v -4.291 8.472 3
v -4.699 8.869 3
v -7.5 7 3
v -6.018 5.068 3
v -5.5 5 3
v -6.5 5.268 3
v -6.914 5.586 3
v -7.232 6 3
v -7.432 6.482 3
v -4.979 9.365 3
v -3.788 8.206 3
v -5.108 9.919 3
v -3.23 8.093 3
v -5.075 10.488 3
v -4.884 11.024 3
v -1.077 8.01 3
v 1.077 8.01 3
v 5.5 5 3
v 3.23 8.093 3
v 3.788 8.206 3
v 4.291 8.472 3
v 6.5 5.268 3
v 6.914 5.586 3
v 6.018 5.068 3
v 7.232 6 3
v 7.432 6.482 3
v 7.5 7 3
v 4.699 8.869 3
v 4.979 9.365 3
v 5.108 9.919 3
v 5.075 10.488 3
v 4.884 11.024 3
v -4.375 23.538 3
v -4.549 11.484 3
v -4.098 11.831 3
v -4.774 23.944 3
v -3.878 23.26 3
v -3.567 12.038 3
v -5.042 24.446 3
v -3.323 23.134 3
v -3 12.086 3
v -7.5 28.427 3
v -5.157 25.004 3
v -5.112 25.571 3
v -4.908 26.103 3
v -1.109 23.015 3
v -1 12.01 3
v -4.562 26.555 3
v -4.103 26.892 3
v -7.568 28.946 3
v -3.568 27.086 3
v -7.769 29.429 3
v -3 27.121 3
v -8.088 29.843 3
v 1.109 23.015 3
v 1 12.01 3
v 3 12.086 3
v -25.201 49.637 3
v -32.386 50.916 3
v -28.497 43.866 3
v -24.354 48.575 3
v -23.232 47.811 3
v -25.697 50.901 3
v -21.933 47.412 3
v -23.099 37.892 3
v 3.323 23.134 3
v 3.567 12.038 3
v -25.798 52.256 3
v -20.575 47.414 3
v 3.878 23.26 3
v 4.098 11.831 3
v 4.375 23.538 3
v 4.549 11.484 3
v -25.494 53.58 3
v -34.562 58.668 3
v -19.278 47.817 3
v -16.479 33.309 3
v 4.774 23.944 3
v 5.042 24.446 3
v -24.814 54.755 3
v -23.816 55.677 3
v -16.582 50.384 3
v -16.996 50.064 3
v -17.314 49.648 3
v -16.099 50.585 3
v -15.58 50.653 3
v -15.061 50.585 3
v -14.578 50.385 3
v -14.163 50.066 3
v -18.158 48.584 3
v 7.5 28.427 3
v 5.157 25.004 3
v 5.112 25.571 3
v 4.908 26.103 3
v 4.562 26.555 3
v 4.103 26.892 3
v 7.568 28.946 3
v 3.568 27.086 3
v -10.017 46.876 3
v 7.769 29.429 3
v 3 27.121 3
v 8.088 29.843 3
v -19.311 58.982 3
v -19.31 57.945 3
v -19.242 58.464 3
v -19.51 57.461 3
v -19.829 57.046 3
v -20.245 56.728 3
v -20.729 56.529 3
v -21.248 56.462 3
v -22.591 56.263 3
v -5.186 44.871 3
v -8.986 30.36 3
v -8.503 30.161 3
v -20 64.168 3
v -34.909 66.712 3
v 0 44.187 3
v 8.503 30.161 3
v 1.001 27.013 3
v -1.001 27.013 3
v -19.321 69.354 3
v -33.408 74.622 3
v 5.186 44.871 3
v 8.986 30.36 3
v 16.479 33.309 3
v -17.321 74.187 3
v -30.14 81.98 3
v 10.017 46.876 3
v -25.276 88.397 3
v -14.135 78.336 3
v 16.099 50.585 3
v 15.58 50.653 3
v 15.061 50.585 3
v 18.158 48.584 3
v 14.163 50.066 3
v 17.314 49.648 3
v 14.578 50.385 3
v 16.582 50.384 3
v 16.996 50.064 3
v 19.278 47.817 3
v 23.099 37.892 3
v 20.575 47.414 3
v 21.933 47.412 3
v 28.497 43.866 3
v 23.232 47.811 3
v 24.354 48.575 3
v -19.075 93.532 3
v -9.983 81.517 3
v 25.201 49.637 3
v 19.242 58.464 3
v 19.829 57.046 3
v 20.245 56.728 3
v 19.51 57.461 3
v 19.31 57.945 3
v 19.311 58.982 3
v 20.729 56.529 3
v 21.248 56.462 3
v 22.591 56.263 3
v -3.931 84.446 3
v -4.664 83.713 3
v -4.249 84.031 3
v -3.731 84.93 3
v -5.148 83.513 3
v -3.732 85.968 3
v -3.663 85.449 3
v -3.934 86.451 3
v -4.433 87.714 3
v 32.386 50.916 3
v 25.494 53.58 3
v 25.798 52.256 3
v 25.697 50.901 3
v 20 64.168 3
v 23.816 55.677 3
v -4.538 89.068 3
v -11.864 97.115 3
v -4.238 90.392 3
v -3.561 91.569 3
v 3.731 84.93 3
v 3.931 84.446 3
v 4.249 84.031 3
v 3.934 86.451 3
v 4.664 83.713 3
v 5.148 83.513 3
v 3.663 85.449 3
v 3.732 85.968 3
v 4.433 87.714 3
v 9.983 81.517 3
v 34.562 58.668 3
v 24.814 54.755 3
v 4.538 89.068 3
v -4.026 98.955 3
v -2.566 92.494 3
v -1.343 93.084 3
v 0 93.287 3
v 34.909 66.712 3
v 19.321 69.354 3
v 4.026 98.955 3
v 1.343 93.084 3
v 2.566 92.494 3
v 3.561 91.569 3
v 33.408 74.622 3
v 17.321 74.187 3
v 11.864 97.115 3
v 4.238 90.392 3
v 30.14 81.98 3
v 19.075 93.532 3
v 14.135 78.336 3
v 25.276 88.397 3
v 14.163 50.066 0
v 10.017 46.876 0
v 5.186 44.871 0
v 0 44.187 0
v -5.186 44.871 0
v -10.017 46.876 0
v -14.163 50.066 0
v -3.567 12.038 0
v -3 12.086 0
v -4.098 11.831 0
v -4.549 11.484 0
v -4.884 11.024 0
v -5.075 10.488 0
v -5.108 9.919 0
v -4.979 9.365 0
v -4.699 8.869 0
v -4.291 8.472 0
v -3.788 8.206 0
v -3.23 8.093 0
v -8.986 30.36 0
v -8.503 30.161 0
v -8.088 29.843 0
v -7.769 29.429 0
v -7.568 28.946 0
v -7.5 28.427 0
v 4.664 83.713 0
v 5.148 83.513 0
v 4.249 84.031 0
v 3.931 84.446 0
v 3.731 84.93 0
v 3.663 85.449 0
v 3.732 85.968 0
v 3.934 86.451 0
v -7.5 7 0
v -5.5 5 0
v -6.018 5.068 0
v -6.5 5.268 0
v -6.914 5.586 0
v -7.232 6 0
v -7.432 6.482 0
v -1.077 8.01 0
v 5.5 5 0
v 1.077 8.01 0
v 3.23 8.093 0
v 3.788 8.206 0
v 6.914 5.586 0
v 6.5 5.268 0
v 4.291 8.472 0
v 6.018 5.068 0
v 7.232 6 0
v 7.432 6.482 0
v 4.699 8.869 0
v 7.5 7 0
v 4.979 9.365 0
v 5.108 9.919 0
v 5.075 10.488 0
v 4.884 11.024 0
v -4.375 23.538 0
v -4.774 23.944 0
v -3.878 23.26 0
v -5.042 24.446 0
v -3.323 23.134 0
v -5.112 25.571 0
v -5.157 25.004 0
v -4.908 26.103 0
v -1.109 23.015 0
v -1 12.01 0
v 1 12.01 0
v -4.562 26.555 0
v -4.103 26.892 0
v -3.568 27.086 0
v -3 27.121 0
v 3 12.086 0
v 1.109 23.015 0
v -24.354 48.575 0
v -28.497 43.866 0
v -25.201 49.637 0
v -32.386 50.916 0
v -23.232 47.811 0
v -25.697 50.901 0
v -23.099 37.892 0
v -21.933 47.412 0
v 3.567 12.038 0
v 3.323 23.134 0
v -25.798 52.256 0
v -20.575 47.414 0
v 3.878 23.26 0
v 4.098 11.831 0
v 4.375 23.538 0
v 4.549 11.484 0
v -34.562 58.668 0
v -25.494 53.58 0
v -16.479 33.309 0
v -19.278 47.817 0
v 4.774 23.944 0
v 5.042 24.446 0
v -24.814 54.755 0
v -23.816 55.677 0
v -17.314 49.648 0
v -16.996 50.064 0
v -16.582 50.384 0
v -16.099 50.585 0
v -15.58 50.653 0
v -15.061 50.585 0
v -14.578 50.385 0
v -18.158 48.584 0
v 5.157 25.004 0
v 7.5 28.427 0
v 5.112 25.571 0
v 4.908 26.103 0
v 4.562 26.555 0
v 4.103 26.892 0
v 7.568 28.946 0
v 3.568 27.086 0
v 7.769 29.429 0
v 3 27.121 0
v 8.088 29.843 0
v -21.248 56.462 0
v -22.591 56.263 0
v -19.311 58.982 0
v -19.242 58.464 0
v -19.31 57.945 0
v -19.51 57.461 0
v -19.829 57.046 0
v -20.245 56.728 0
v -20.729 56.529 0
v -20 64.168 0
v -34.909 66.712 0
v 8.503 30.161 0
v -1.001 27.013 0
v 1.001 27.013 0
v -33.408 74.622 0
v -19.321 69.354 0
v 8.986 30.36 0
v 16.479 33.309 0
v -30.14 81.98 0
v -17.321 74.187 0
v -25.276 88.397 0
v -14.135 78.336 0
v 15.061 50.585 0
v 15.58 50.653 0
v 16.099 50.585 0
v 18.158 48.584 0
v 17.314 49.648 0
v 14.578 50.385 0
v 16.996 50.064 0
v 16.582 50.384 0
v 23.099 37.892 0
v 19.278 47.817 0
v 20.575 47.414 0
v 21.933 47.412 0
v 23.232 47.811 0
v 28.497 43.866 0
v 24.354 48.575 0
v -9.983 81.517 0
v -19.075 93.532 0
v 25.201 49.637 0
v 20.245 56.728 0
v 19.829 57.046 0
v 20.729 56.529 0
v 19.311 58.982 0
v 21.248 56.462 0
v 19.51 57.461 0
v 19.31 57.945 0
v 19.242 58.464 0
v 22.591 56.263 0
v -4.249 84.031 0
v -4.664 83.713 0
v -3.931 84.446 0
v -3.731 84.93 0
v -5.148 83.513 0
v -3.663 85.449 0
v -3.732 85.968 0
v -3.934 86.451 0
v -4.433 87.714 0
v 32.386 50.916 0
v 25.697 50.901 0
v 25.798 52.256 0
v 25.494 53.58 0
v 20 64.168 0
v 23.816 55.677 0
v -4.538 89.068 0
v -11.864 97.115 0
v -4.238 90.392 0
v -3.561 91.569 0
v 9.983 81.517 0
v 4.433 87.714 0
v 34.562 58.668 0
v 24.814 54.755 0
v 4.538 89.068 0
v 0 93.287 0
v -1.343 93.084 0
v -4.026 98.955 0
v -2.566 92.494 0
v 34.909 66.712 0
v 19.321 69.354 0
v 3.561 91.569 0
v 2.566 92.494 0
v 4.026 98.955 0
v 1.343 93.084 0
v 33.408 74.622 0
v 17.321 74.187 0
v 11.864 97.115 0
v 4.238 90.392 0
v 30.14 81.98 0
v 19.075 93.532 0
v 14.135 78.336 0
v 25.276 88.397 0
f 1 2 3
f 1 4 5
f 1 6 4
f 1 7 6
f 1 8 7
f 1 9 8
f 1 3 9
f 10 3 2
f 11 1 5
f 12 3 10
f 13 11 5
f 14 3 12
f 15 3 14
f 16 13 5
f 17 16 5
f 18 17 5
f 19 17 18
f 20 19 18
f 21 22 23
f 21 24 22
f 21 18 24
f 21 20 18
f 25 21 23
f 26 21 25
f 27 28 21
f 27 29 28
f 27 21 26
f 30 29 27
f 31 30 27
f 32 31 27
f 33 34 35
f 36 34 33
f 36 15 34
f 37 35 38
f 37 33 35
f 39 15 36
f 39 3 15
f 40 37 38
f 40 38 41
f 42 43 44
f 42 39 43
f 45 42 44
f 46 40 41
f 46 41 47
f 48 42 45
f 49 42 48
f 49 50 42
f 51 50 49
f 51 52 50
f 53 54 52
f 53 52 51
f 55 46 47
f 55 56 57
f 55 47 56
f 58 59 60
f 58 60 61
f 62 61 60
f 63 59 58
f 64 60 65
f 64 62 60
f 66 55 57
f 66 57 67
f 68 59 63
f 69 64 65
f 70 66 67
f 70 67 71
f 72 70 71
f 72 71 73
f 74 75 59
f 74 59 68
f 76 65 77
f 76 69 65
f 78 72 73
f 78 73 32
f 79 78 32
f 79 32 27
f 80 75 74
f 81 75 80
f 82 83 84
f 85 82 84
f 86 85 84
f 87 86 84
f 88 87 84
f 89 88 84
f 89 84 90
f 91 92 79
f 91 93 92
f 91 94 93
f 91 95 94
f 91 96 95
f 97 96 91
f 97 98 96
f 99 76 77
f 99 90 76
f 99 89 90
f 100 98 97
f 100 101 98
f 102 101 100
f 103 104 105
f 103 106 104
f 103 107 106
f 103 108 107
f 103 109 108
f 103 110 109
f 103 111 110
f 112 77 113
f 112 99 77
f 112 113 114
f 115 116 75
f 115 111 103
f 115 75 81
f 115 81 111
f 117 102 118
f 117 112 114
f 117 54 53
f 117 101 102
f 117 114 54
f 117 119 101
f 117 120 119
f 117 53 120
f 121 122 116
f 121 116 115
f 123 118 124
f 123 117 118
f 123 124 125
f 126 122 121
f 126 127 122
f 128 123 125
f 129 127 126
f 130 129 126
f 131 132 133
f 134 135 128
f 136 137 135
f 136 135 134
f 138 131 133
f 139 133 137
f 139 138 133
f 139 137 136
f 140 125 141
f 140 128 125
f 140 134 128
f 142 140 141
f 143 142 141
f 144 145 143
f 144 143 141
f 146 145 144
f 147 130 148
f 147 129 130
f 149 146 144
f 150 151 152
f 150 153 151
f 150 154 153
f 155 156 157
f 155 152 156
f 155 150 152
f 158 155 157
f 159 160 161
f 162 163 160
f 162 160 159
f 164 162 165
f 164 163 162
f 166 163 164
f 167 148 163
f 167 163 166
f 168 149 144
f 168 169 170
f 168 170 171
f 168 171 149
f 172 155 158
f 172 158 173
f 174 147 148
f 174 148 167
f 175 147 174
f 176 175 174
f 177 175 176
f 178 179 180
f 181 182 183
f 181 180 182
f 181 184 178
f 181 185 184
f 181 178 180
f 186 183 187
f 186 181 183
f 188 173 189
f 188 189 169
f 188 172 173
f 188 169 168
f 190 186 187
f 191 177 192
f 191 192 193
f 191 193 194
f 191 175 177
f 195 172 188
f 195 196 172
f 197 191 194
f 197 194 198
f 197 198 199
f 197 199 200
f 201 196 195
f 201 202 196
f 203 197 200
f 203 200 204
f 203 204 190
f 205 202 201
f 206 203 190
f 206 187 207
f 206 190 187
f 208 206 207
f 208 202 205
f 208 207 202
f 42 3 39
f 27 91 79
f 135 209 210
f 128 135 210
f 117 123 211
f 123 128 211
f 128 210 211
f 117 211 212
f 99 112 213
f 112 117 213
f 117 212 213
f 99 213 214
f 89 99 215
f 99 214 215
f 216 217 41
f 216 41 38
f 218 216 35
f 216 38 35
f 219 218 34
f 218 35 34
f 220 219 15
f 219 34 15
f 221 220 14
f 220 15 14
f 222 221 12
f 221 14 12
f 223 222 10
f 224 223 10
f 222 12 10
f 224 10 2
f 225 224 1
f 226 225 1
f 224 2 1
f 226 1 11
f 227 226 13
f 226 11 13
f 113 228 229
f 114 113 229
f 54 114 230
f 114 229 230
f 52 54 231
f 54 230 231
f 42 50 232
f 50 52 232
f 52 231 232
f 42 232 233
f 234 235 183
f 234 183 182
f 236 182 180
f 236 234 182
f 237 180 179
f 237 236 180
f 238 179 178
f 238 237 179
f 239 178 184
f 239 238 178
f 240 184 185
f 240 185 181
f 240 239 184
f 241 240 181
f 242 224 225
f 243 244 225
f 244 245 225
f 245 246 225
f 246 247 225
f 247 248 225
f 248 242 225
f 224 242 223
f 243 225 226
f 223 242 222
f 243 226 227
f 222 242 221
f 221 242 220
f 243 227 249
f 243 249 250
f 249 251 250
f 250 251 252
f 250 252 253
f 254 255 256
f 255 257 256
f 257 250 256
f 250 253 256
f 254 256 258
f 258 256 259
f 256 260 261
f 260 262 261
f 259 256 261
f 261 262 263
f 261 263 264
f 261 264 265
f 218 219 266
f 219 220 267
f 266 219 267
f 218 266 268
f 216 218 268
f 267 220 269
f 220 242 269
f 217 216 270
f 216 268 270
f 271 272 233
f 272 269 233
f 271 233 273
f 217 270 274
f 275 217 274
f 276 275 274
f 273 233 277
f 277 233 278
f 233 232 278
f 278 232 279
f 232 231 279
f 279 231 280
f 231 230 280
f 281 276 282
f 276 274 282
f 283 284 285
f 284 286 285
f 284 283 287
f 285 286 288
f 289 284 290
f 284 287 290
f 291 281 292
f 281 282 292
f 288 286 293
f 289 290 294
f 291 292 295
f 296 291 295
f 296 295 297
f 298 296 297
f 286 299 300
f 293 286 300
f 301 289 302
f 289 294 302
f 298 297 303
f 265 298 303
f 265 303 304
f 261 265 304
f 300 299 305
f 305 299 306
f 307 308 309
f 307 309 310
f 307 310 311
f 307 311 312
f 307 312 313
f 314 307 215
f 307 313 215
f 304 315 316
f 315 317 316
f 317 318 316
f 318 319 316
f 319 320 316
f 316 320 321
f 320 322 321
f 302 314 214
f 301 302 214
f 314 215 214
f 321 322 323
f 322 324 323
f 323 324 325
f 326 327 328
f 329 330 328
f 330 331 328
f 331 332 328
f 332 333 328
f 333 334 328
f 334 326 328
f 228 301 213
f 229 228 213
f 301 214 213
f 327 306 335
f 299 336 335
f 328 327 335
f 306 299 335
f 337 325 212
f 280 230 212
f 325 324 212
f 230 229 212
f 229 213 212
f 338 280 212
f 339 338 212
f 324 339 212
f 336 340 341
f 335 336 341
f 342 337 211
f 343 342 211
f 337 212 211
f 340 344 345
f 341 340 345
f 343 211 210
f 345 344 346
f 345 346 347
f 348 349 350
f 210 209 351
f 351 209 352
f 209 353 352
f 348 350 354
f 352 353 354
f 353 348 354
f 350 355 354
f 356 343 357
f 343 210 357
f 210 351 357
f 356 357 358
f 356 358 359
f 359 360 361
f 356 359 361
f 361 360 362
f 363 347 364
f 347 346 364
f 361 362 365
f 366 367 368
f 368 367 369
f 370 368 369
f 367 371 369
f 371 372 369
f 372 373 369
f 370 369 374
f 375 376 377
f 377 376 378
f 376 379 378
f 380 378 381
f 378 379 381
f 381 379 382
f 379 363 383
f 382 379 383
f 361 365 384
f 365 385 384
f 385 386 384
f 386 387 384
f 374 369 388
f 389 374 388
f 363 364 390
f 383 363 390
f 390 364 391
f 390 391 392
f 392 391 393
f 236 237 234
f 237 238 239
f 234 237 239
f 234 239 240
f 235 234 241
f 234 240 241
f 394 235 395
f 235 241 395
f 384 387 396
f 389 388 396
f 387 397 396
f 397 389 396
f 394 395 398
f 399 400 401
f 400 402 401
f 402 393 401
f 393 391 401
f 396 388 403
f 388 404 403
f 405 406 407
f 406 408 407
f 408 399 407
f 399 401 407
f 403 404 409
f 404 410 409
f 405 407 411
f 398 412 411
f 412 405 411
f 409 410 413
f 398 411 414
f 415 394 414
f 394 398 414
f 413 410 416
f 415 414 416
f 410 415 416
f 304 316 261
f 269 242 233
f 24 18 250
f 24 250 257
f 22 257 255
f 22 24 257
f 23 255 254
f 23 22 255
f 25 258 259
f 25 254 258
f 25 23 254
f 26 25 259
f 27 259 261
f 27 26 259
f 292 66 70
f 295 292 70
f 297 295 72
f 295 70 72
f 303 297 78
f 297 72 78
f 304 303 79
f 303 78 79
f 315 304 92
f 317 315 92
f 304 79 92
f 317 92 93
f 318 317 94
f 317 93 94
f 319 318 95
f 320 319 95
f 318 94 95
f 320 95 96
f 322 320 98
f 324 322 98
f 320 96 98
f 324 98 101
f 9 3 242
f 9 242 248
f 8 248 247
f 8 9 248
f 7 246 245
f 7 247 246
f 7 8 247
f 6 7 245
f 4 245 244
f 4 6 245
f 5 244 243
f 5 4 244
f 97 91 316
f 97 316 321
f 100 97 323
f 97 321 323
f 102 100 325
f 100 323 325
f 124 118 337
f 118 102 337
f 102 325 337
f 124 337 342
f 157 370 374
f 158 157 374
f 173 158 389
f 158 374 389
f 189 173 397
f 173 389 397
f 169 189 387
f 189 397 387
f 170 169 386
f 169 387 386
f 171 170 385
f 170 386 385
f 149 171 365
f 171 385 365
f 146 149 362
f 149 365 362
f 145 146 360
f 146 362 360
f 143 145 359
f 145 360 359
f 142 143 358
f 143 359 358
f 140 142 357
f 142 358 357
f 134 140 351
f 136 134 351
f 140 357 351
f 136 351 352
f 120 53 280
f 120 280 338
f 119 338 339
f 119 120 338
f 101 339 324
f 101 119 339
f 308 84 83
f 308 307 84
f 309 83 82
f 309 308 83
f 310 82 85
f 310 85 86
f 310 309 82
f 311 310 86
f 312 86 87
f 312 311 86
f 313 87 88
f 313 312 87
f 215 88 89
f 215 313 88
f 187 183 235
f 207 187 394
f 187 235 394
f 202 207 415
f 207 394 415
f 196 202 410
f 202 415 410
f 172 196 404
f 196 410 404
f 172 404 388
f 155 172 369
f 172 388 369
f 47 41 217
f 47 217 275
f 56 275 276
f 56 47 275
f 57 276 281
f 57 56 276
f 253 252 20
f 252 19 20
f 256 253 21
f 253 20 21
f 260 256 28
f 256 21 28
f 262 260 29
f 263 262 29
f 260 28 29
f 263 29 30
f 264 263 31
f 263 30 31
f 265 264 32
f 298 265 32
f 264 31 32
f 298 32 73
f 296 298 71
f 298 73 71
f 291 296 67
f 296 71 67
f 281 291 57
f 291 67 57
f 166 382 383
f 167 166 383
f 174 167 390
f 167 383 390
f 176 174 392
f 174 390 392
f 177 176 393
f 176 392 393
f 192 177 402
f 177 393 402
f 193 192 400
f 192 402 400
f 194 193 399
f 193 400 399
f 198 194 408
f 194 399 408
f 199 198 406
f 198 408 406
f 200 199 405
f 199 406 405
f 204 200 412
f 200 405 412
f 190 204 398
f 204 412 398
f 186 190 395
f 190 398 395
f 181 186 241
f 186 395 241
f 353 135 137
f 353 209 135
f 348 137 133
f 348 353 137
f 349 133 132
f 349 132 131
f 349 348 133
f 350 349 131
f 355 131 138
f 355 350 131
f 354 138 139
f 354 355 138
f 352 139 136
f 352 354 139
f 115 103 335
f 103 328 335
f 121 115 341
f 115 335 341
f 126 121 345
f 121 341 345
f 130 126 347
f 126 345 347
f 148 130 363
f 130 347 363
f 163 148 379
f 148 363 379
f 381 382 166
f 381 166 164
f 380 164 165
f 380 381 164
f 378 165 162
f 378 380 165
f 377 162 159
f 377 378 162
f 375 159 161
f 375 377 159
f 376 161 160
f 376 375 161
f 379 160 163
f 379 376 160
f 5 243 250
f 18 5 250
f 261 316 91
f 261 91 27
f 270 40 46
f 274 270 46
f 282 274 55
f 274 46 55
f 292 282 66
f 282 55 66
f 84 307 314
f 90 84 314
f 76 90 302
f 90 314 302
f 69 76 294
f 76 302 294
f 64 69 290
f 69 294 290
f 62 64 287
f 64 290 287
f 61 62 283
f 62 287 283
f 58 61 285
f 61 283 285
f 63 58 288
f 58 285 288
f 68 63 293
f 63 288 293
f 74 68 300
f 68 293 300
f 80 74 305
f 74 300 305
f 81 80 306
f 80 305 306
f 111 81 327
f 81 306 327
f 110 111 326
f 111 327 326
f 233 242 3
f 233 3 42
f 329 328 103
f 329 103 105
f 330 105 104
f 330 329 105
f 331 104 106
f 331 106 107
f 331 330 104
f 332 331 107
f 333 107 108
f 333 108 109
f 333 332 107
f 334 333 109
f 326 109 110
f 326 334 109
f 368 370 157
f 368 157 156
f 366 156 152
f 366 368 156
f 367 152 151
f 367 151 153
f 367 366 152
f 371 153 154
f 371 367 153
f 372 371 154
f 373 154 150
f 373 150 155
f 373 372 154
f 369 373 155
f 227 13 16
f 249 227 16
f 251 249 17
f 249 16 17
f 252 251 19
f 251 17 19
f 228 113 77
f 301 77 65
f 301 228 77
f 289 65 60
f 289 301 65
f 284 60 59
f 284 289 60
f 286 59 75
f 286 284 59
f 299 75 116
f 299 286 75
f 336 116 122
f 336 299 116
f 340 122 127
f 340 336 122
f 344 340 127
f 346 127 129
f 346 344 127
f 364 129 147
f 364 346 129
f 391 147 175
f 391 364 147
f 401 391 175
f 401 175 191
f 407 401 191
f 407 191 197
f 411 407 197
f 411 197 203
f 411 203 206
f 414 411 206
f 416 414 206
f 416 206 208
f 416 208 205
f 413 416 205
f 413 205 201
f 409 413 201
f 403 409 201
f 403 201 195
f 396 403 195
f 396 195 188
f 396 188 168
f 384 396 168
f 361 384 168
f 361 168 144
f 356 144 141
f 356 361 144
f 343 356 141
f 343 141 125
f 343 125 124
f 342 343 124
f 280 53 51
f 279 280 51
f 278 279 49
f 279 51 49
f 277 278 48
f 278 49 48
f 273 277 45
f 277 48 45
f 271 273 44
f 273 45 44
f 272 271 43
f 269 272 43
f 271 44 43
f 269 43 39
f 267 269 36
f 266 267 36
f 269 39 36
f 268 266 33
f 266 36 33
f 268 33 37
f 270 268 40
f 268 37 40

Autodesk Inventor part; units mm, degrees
ref_plane "YZ Plane" through (0, 0, 0) normal (1, 0, 0) x (0, 1, 0)
ref_plane "XZ Plane" through (0, 0, 0) normal (0, 1, 0) x (-1, 0, 0)
ref_plane "XY Plane" through (0, 0, 0) normal (0, 0, 1) x (1, 0, 0)
sketch "Эскиз1" plane through (0, 0, 0) normal (0, 0, 1) x (1, 0, 0)
  line L0 (17.5, 5) -> (-17.5, 5) construction
  line L1 (-17.5, 5) -> (-17.5, -5) construction
  line L2 (-17.5, -5) -> (17.5, -5) construction
  line L3 (17.5, -5) -> (17.5, 5) construction
  line L4 (17.5, 5) -> (-17.5, -5) construction
  line L5 (-17.5, 5) -> (17.5, -5) construction
  line L6 (12.8471, 5) -> (-11.1661, 5) construction
  circle A0 centre (0, 64.187) radius 35
  circle A1 centre (0, 64.187) radius 20
  line L7 (0, 64.187) -> (0, 0) construction
  circle A2 centre (0, 88.737) radius 4.55
  line L8 (-7.5, 5) -> (-7.5, 30)
  line L9 (7.5, 30) -> (7.5, 5)
  line L10 (-2, 49.2906) -> (2, 49.2906) construction
  line L11 (-7.5, 5) -> (7.5, 5)
  line L12 (-2, 85.687) -> (2, 85.687)
  line L13 (2, 85.687) -> (2, 82.687)
  line L14 (2, 82.687) -> (-2, 82.687)
  line L15 (-2, 82.687) -> (-2, 85.687)
  line L16 (-2, 85.687) -> (2, 82.687) construction
  line L17 (2, 85.687) -> (-2, 82.687) construction
  line L18 (-17.6195, 51.7049) -> (-19.6195, 55.169)
  circle A3 centre (-21.2609, 51.912) radius 4.55
  line L19 (-17.0215, 56.669) -> (-15.0215, 53.2049)
  line L20 (-19.6195, 55.169) -> (-17.0215, 56.669)
  line L21 (-15.0215, 53.2049) -> (-17.6195, 51.7049)
  line L22 (19.6195, 55.169) -> (17.6195, 51.7049)
  circle A4 centre (21.2609, 51.912) radius 4.55
  line L23 (15.0215, 53.2049) -> (17.0215, 56.669)
  line L24 (17.6195, 51.7049) -> (15.0215, 53.2049)
  line L25 (17.0215, 56.669) -> (19.6195, 55.169)
  point P0 (0, 89.2906)
  point P1 (0, 84.187)
  point P2 (-17.3205, 54.187)
  point P3 (17.3205, 54.187)
  point P4 (18.2337, 55.9692)
  point P5 (18.7216, 55.6875)
  point P6 (16.7216, 52.2234)
  point P7 (16.2337, 52.5051)
  point P8 (-16.2337, 52.5051)
  point P9 (-16.7216, 52.2234)
  point P10 (-18.7216, 55.6875)
  point P11 (-18.2337, 55.9692)
  point P12 (-2, 84.0867)
  point P13 (-2, 84.6501)
  point P14 (2, 84.6501)
  point P15 (2, 84.0867)
  dimension "d3" = 40
  dimension "d4" = 9.1
  dimension "d0" = 70
  dimension "d9" = 35
  dimension "d10" = 25
  dimension "d11" = 10
  dimension "d12" = 15
  dimension "d14" = 7.5
  dimension "d30" = 4
  dimension "d31" = 3
  dimension "d34" = 360
extrude "Выдавливание1" add sketch "Эскиз1" along normal blind 3
fillet "Сопряжение1" radius 2 14 edges at (-7.5, 30, 1.5) (7.5, 30, 1.5) (-18.2337, 55.9692, 1.5) (-18.7216, 55.6875, 1.5) (-16.2337, 52.5051, 1.5) (-16.7216, 52.2234, 1.5) (-2, 84.0867, 1.5) (-2, 84.6501, 1.5) (2, 84.0867, 1.5) (2, 84.6501, 1.5) (18.7216, 55.6875, 1.5) (18.2337, 55.9692, 1.5) (16.7216, 52.2234, 1.5) (16.2337, 52.5051, 1.5)
sketch "Эскиз2" plane through (0, 0, 3) normal (0, 0, 1) x (1, 0, 0)
  circle A0 centre (0, 25) radius 2 construction
  circle A1 centre (0, 10) radius 2 construction
  line L0 (0, 0) -> (0, 43.9437)
  line L1 (0, 10) -> (0, 5)
  line L2 (-7.5, 5) -> (7.5, 5) projected
  arc A2 (19.3109, 58.9824) -> (5.1482, 83.513) centre (0, 64.187) ccw projected
  arc A3 (-3.1613, 25.1277) -> (3.1613, 25.1277) centre (0, 64.187) ccw construction
  arc A4 (-3.3227, 23.1342) -> (3.3227, 23.1342) centre (0, 64.187) ccw
  arc A5 (-3, 27.1212) -> (3, 27.1212) centre (0, 64.187) ccw
  arc A6 (-3, 27.1212) -> (-3.3227, 23.1342) centre (-3.1613, 25.1277) ccw
  arc A7 (3.3227, 23.1342) -> (3, 27.1212) centre (3.1613, 25.1277) ccw
  arc A8 (-3.115, 10.0896) -> (3.115, 10.0896) centre (0, 64.187) ccw construction
  arc A9 (-3.2299, 8.0929) -> (3.2299, 8.0929) centre (0, 64.187) ccw
  arc A10 (-3, 12.0863) -> (3, 12.0863) centre (0, 64.187) ccw
  arc A11 (-3, 12.0863) -> (-3.2299, 8.0929) centre (-3.115, 10.0896) ccw
  arc A12 (3.2299, 8.0929) -> (3, 12.0863) centre (3.115, 10.0896) ccw
  dimension "d24" = 15
  dimension "d25" = 5
  dimension "d26" = 4
  dimension "d27" = 4
  dimension "d39" = 4
  dimension "d40" = 6
  dimension "d41" = 4
  dimension "d42" = 6
extrude "Выдавливание2" cut sketch "Эскиз2" against normal blind 4
fillet "Сопряжение2" radius 2 2 edges at (7.5, 5, 1.5) (-7.5, 5, 1.5)
properties part number "Деталь2_мозговорот"
